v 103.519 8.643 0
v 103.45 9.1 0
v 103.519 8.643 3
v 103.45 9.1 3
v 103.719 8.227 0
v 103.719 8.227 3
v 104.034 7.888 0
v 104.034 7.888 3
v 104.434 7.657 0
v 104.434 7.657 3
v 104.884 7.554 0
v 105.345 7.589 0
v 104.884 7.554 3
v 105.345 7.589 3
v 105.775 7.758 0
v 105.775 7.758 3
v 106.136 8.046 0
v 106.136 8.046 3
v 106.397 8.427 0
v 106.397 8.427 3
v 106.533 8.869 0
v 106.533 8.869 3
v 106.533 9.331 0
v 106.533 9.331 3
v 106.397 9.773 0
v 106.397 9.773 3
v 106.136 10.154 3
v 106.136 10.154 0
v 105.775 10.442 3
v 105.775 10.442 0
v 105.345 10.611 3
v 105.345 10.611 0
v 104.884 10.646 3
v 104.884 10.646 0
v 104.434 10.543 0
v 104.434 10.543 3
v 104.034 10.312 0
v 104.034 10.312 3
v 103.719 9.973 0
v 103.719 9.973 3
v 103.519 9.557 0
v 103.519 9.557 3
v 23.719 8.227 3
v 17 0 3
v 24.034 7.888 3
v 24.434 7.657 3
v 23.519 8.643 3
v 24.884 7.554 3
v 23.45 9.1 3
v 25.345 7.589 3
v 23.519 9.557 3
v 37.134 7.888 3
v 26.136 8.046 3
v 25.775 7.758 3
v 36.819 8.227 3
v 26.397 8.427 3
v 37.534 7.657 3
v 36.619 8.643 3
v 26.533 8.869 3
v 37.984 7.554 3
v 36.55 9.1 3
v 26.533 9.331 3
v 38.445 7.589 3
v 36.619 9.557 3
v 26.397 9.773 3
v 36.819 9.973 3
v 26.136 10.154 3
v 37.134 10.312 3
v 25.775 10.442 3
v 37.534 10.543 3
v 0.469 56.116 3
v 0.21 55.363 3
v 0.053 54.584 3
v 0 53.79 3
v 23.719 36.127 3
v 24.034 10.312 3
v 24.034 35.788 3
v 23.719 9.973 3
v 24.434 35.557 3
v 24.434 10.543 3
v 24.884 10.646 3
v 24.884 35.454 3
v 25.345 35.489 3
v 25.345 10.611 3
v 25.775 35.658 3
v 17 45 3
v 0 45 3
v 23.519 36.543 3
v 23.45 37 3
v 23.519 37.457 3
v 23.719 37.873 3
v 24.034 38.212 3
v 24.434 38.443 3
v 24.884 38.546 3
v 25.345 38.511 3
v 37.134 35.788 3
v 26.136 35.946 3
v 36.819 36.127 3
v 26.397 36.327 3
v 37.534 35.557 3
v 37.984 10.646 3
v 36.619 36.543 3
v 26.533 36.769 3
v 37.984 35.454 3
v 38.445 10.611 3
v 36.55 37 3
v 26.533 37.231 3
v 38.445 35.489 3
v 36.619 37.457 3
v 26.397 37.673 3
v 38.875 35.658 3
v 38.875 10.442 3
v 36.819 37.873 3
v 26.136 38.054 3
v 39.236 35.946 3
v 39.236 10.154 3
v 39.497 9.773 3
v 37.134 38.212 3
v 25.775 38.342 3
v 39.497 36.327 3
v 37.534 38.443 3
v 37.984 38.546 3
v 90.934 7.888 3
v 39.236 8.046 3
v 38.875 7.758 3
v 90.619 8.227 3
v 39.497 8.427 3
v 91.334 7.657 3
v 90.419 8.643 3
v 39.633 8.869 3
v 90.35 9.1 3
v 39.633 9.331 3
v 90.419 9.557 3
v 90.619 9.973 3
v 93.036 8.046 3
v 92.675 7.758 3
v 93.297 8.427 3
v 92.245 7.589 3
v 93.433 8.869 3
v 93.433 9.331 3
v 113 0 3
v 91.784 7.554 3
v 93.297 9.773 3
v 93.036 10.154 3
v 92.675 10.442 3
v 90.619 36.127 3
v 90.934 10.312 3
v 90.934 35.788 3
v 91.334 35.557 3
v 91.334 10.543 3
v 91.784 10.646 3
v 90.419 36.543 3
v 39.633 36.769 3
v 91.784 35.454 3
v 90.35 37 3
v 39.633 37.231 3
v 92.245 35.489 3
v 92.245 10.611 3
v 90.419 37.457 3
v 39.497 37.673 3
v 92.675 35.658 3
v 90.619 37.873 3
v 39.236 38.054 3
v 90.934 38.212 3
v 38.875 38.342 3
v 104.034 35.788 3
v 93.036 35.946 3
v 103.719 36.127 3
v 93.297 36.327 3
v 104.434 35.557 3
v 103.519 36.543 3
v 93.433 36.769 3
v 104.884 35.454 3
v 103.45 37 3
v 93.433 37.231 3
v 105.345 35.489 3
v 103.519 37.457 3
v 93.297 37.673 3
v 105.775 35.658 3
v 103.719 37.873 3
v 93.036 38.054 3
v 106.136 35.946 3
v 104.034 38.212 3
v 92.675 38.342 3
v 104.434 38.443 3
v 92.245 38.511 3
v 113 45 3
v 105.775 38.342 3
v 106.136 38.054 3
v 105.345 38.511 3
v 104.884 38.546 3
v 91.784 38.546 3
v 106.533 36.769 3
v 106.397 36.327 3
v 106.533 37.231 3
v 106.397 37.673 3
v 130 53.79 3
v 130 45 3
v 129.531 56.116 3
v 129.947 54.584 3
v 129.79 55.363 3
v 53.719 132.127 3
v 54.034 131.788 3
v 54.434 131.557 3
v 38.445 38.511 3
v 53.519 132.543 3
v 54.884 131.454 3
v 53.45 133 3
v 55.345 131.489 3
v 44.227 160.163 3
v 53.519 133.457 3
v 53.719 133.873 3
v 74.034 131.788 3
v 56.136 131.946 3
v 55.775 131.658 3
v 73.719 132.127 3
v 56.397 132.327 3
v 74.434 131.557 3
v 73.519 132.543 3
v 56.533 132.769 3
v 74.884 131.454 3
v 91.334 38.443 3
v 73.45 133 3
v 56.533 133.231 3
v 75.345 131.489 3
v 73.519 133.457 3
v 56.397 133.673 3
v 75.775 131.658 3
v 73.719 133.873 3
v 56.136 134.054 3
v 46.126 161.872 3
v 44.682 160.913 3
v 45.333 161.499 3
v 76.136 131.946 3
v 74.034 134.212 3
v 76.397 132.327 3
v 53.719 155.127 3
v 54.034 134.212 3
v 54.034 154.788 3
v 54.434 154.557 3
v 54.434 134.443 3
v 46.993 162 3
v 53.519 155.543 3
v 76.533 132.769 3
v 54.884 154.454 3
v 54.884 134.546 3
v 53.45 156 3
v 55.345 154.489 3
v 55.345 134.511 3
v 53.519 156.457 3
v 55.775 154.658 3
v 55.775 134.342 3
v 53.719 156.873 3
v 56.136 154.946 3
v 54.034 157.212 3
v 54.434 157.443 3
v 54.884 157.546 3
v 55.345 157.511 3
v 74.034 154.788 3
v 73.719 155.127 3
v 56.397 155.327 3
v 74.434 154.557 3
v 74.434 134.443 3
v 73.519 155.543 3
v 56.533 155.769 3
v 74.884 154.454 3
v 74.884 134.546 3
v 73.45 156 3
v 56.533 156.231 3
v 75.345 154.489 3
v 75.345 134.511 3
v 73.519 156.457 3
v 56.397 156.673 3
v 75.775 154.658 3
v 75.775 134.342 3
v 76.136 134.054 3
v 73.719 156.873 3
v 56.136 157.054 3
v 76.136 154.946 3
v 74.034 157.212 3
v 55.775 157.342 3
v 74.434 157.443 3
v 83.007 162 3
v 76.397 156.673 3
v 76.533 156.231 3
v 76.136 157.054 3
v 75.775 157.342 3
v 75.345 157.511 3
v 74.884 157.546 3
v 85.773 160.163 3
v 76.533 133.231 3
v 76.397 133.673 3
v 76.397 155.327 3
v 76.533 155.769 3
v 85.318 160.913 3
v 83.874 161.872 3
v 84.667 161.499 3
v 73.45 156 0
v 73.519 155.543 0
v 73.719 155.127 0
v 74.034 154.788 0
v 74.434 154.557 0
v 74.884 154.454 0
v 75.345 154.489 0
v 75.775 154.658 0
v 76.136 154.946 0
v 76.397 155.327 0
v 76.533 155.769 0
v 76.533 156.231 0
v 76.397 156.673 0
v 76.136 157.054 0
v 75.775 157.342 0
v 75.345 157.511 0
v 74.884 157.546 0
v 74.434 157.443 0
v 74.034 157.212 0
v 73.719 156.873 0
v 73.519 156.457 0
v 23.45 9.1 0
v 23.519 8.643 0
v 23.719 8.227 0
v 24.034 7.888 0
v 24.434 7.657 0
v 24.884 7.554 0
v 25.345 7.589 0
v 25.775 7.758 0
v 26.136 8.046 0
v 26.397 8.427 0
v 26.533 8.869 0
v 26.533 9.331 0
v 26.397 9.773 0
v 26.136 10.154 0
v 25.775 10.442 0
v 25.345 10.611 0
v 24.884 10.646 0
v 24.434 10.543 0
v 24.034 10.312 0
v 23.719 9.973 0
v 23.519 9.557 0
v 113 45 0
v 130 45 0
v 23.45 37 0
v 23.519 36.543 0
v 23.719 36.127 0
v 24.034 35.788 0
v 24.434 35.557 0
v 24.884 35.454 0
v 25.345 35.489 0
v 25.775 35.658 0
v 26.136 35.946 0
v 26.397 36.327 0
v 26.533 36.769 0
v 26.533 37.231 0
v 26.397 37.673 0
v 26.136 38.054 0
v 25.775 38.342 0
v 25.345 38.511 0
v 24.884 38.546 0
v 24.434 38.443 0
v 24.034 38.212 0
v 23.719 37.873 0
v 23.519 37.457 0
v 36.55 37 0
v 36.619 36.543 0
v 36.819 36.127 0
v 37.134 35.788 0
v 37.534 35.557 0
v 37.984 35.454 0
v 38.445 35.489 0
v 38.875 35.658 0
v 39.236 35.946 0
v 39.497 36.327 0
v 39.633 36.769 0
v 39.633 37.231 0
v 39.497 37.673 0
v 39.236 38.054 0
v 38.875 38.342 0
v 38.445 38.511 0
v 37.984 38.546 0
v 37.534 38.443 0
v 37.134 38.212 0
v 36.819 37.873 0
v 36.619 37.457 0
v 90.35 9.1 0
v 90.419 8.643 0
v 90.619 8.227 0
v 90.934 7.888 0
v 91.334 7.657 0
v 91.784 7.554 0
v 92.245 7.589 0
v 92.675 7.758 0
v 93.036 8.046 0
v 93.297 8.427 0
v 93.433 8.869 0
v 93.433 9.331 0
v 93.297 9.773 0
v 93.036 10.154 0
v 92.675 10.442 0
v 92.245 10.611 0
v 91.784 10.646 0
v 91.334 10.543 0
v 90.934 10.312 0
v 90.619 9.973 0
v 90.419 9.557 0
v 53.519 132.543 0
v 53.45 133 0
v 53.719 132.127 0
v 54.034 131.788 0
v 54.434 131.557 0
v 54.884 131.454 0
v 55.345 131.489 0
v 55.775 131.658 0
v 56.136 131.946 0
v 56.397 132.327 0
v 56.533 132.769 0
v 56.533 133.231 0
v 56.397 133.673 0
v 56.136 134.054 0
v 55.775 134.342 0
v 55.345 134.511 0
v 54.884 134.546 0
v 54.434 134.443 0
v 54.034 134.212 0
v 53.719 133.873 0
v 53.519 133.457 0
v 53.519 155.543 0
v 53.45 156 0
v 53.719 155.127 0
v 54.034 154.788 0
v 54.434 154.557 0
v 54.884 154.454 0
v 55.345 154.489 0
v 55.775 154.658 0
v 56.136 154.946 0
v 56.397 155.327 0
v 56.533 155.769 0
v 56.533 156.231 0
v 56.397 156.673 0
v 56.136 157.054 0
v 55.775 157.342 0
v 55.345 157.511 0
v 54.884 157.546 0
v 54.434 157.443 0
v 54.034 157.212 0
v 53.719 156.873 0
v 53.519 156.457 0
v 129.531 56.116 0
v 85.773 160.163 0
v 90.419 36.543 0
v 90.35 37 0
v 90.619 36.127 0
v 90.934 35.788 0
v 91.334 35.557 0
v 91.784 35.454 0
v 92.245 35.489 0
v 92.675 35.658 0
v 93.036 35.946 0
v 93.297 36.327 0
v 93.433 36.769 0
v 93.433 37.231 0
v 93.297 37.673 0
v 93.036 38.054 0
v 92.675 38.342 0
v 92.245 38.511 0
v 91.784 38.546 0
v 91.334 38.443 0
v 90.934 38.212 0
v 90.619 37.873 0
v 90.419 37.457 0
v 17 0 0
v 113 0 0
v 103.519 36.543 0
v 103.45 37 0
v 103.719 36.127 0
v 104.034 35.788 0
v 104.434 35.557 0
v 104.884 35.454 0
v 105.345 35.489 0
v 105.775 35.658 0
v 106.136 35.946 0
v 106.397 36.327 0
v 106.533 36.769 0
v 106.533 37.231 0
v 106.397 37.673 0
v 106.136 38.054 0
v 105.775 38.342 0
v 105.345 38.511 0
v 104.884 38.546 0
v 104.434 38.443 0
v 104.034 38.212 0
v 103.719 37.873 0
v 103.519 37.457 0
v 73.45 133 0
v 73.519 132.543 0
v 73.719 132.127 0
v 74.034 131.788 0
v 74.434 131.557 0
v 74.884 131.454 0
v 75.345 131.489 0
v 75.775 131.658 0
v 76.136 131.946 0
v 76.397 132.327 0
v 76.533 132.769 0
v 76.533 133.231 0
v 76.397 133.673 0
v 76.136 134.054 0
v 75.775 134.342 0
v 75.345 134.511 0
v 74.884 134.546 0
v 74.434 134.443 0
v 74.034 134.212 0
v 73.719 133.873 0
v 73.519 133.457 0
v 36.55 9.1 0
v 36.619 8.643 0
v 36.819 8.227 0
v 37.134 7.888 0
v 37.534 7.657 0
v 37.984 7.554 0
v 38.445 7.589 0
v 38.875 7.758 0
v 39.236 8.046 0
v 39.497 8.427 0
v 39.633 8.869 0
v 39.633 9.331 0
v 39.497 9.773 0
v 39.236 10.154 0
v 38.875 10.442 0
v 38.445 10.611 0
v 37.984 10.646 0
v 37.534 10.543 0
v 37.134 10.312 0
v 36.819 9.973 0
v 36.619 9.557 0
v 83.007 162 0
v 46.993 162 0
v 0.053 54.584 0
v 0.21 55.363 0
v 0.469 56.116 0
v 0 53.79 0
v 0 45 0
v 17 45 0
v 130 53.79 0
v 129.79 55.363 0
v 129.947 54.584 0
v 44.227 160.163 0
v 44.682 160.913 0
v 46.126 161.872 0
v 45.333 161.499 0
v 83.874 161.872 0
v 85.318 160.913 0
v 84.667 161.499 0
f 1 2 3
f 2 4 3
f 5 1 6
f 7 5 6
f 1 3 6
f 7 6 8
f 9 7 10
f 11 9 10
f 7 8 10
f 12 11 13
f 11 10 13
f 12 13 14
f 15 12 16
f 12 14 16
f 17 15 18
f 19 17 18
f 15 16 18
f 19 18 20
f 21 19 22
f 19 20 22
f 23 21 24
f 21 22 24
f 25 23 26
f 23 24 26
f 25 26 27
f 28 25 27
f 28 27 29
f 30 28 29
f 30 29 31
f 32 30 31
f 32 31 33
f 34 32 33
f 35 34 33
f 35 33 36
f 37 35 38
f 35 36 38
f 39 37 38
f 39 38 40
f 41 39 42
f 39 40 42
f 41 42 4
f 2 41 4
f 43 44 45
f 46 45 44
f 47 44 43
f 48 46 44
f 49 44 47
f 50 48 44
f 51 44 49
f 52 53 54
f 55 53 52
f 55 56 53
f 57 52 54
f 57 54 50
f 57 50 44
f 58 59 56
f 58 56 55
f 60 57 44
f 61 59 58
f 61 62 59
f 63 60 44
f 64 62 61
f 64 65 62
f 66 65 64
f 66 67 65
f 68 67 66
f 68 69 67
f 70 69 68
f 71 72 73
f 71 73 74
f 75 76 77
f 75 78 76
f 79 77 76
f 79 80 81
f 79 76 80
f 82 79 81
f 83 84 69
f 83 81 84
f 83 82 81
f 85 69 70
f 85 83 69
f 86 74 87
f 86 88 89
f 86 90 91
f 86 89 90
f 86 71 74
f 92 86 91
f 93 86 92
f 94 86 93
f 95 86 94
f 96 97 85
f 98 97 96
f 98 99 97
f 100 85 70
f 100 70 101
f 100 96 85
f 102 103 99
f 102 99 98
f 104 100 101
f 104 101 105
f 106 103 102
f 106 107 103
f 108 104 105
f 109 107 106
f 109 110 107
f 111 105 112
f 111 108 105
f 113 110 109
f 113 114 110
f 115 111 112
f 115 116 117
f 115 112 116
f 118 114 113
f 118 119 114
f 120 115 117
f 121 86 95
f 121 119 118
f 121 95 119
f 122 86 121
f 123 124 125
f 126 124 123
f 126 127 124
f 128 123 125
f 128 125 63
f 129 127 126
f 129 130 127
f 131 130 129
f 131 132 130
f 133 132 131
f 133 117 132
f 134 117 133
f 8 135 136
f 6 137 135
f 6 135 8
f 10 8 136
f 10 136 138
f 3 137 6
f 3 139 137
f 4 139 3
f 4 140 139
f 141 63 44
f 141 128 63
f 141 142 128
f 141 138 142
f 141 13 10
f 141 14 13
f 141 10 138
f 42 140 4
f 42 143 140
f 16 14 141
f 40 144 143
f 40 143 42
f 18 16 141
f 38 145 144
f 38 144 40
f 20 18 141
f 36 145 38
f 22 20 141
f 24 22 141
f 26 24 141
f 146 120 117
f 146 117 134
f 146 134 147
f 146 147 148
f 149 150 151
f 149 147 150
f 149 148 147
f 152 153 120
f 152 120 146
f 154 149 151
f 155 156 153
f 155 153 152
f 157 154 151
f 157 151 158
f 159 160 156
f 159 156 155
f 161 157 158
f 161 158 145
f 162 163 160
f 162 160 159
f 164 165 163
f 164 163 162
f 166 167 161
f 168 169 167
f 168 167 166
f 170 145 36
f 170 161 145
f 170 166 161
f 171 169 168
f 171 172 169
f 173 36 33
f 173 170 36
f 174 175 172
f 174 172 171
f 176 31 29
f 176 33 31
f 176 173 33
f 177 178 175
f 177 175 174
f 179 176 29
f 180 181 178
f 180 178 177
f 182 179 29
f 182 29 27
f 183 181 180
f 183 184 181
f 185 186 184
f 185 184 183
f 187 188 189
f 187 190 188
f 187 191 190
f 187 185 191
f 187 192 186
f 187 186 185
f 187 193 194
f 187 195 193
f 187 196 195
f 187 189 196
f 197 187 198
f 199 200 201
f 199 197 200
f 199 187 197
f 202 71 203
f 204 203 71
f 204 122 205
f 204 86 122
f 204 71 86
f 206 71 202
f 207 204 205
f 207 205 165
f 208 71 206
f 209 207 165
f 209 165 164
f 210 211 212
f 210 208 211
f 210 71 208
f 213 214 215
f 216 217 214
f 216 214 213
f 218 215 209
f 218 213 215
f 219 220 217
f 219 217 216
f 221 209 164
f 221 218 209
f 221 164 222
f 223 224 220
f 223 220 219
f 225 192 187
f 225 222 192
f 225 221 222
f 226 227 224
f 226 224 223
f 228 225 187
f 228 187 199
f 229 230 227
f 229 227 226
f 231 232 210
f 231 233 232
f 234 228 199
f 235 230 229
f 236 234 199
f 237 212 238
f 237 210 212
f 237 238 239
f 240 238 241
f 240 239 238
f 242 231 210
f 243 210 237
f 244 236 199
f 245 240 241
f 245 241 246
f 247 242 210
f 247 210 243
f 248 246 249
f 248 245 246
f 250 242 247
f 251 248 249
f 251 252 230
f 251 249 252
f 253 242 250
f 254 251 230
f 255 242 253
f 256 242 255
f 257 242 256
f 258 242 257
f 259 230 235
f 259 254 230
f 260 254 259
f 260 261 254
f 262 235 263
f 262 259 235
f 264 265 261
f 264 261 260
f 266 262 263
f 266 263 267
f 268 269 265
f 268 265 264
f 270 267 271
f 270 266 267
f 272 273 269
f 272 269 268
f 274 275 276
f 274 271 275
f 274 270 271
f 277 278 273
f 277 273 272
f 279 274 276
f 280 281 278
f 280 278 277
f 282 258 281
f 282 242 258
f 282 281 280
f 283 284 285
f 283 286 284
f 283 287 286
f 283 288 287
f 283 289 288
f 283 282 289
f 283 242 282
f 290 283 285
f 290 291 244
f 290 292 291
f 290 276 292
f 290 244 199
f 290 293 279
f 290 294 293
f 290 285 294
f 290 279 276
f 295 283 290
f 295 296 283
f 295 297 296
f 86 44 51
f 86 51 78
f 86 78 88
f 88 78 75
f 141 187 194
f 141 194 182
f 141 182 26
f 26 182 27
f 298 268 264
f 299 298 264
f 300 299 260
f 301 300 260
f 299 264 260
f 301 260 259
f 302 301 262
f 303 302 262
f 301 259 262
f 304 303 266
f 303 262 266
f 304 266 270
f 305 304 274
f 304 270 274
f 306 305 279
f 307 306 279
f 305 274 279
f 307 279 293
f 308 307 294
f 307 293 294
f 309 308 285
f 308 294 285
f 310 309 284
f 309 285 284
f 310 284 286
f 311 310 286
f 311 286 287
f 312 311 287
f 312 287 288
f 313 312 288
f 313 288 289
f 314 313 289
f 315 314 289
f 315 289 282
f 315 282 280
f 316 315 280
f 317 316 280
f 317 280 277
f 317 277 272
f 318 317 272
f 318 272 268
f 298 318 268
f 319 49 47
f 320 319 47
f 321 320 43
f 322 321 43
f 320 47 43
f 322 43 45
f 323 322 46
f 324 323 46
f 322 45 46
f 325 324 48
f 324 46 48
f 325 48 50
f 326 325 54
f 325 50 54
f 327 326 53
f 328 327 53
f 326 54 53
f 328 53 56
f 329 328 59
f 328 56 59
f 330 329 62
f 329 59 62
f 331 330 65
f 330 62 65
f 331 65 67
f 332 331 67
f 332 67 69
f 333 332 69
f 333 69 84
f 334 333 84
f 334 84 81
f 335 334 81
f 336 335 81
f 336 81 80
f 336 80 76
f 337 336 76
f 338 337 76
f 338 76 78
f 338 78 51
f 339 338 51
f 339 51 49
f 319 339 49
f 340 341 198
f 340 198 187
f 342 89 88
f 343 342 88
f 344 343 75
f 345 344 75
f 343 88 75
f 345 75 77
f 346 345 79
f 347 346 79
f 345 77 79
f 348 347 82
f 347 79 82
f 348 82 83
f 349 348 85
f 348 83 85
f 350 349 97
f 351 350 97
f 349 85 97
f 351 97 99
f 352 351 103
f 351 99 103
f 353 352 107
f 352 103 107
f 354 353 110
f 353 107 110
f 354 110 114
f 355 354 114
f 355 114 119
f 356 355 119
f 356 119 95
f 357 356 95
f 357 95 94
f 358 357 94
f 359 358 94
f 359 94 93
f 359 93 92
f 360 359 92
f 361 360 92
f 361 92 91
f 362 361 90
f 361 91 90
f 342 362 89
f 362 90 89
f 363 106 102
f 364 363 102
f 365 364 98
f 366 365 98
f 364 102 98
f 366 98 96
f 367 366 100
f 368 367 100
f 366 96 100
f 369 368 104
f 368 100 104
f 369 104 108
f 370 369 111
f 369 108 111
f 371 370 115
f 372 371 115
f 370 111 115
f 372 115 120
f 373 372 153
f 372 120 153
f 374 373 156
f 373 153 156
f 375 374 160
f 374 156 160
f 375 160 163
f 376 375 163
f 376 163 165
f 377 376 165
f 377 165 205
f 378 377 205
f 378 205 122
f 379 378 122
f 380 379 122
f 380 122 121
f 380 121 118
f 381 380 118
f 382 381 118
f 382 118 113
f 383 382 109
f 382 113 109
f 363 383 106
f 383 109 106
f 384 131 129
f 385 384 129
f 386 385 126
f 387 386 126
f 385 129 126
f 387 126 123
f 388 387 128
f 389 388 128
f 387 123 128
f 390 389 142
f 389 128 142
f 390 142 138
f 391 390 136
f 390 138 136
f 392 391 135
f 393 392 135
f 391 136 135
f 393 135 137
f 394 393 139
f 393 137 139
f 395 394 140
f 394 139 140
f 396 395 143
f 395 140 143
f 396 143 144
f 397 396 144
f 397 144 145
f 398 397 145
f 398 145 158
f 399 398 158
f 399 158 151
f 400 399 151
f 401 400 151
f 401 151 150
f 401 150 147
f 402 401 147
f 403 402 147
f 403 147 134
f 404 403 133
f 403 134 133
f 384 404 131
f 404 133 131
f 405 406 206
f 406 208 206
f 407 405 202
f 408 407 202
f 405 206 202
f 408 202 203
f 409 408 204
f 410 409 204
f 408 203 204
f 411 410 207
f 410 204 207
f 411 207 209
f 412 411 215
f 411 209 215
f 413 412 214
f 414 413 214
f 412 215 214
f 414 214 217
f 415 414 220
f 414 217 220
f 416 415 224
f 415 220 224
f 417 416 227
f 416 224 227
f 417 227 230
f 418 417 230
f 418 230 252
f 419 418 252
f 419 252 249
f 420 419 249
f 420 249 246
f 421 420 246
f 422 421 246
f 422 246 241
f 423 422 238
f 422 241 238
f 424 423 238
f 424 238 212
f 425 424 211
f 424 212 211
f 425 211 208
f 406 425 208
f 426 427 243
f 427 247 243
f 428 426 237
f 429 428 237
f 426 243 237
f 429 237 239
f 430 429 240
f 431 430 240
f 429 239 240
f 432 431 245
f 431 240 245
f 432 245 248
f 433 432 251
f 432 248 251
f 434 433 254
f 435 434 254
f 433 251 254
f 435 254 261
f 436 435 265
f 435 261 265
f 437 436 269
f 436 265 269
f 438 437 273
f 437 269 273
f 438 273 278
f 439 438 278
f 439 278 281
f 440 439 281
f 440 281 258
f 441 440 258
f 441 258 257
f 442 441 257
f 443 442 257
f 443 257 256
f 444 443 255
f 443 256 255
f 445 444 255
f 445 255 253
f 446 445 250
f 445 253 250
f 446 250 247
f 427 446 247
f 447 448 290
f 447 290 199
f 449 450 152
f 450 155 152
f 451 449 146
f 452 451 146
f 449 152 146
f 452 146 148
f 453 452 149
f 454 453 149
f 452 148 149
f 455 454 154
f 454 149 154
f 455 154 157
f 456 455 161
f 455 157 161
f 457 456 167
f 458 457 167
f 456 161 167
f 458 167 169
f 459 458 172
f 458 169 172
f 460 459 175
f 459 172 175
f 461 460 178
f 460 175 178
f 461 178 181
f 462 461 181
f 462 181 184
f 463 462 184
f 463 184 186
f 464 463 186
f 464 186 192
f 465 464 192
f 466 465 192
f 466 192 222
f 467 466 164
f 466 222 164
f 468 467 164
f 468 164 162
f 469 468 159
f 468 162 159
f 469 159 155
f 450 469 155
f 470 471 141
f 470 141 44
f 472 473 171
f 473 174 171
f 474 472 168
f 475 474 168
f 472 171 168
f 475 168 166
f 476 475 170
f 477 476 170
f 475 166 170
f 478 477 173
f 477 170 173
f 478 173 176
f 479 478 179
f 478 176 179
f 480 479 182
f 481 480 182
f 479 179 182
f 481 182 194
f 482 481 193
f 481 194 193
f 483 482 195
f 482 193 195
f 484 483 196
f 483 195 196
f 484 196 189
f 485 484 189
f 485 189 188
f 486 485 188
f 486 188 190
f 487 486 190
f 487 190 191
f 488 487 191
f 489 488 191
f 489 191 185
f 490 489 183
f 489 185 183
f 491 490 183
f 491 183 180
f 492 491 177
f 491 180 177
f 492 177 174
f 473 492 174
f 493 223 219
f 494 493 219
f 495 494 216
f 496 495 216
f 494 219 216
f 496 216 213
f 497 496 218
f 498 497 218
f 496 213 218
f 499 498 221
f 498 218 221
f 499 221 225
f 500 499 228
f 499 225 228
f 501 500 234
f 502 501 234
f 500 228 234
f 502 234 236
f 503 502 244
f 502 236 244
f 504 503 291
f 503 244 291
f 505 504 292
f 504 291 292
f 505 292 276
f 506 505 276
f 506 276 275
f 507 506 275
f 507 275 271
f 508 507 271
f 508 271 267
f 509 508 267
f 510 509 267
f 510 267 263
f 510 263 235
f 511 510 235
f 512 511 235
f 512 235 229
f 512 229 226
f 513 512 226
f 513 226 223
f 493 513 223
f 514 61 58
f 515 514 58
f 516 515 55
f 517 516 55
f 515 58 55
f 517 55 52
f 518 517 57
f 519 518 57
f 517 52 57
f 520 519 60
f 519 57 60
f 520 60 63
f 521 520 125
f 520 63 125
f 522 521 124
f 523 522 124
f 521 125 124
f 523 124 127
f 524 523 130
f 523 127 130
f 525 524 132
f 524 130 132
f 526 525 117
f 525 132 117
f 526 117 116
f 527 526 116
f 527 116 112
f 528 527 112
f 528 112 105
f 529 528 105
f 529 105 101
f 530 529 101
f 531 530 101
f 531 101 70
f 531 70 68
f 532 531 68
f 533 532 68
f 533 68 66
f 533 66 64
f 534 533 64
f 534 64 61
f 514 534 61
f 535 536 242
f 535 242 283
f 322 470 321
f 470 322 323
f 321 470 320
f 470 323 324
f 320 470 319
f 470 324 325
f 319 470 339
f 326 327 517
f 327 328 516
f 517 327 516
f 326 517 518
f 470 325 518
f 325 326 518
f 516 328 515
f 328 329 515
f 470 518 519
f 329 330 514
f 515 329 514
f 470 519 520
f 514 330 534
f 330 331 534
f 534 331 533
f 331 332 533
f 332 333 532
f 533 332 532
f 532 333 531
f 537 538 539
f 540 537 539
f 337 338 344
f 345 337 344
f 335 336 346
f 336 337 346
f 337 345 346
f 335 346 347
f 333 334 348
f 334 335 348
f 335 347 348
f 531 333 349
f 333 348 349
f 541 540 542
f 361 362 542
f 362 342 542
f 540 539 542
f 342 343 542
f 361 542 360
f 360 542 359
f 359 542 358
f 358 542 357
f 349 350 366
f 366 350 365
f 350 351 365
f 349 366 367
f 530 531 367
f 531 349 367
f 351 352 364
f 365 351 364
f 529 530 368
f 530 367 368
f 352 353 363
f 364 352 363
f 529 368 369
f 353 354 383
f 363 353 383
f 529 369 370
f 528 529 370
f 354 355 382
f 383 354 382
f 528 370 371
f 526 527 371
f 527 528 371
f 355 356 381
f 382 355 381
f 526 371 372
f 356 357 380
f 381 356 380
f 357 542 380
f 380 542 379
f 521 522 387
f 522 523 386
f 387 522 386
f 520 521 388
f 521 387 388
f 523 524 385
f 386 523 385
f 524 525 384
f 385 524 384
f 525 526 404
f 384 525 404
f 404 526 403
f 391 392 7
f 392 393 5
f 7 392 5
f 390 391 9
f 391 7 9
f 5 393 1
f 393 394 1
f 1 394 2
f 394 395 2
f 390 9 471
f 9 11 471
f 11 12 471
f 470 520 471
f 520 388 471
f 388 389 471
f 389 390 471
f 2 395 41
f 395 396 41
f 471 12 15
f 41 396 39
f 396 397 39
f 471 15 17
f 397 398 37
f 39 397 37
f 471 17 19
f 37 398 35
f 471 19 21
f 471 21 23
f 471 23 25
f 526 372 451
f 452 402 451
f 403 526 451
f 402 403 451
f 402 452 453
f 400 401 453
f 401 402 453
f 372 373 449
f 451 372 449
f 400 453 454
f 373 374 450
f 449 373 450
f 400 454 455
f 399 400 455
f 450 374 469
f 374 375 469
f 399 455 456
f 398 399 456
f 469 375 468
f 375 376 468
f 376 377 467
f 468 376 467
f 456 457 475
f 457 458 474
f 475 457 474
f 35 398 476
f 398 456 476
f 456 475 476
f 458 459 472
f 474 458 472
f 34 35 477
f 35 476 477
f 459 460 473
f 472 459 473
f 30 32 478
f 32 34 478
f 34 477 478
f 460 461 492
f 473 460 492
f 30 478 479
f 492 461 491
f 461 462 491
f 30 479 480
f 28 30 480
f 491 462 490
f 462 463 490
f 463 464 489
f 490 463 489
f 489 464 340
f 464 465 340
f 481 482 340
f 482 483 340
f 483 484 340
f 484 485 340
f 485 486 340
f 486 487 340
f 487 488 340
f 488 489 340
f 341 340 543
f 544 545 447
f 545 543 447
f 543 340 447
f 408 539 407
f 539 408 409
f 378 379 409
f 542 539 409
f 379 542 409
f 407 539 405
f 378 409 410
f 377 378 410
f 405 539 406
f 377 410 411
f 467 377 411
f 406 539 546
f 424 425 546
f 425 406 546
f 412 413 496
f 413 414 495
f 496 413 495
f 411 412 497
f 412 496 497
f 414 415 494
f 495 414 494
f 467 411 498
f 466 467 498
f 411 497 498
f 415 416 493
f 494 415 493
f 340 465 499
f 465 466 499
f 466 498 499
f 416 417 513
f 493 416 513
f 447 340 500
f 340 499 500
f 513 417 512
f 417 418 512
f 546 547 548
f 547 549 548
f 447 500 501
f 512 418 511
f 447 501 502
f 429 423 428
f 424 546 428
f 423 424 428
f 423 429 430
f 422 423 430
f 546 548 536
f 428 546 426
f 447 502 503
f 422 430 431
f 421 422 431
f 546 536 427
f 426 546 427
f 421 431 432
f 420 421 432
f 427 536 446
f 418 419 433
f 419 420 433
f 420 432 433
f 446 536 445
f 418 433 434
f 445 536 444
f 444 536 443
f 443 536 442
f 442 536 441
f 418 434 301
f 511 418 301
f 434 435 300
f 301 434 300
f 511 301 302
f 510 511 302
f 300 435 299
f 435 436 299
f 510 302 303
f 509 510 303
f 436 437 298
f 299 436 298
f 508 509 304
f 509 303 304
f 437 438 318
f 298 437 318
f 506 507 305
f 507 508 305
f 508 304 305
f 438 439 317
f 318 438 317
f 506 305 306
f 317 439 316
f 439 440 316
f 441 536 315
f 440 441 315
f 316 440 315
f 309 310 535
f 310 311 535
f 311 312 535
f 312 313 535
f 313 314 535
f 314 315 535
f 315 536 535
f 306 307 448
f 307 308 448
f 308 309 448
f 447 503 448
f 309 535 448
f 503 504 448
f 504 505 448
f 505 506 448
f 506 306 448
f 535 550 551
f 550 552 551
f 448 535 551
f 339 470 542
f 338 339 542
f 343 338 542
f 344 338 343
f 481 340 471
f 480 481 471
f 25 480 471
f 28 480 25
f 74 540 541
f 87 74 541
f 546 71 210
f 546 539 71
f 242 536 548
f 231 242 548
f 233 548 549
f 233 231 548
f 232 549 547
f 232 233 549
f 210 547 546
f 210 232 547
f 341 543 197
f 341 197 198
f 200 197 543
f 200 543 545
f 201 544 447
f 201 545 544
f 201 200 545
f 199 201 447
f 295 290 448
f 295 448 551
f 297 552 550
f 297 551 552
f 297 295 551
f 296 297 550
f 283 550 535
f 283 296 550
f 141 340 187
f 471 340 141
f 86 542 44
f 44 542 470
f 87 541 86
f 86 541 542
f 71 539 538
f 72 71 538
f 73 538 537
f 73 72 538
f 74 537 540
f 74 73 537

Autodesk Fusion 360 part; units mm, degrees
sketch "Main" plane through (0, 0, 0) normal (0, 0, 1) x (1, 0, 0)
  line L0 (0, 55) -> (45, 162)
  line L1 (45, 162) -> (85, 162)
  line L2 (85, 162) -> (130, 55)
  line L3 (113, 0) -> (17, 0)
  line L4 (65, 0) -> (65, 162) construction
  line L5 (0, 55) -> (0, 45)
  line L6 (0, 45) -> (17, 45)
  line L7 (17, 45) -> (17, 0)
  line L8 (130, 55) -> (130, 45)
  line L9 (130, 45) -> (113, 45)
  line L10 (113, 45) -> (113, 0)
  dimension "d2" = 162
  dimension "d6" = 55
  dimension "d9" = 40
  dimension "d45" = 130
  dimension "d47" = 17
  dimension "d48" = 17
  dimension "d49" = 10
  dimension "d50" = 10
extrude "Extrude1" add sketch "Main" along normal blind 3
sketch "Head Tube Holes" plane through (0, 0, 3) normal (0, 0, 1) x (-1, 0, 0)
  line L0 (-17, 0) -> (-113, 0)
  line L1 (-130, -55) -> (-85, -162)
  line L2 (-85, -162) -> (-45, -162)
  line L3 (-45, -162) -> (0, -55)
  circle A0 centre (-55, -156) radius 1.55
  line L4 (-65, -162) -> (-65, 0) construction
  circle A1 centre (-75, -156) radius 1.55
  circle A2 centre (-55, -133) radius 1.55
  circle A3 centre (-75, -133) radius 1.55
  line L5 (0, -55) -> (0, -45)
  line L6 (0, -45) -> (-17, -45)
  line L7 (-17, -45) -> (-17, 0)
  line L8 (-113, 0) -> (-113, -45)
  line L9 (-113, -45) -> (-130, -45)
  line L10 (-130, -45) -> (-130, -55)
  dimension "d19" = 3.1
  dimension "d20" = 6
  dimension "d21" = 10
  dimension "d24" = -20
  dimension "d25" = 23
extrude "Extrude2" cut sketch "Head Tube Holes" against normal up to surface (3 mm away) contours A0 | A1 | A2 | A3
sketch "Motor Box Holes" plane through (0, 0, 3) normal (0, 0, 1) x (-1, 0, 0)
  circle A0 centre (-75, -156) radius 1.55
  circle A1 centre (-55, -156) radius 1.55
  circle A2 centre (-75, -133) radius 1.55
  circle A3 centre (-55, -133) radius 1.55
  line L0 (-17, 0) -> (-113, 0)
  line L1 (-17, -37) -> (-113, -37) construction
  circle A4 centre (-25, -37) radius 1.55
  circle A5 centre (-38.1, -37) radius 1.55
  circle A6 centre (-25, -9.1) radius 1.55
  circle A7 centre (-38.1, -9.1) radius 1.55
  circle A8 centre (-105, -37) radius 1.55
  circle A9 centre (-91.9, -37) radius 1.55
  circle A10 centre (-105, -9.1) radius 1.55
  circle A11 centre (-91.9, -9.1) radius 1.55
  line L2 (-17, -45) -> (-17, 0)
  line L3 (-113, 0) -> (-113, -45)
  dimension "d30" = 3.1
  dimension "d32" = 37
  dimension "d35" = -13.1
  dimension "d36" = 27.9
  dimension "d37" = 3.1
  dimension "d40" = 13.1
  dimension "d41" = 27.9
  dimension "d53" = 8
  dimension "d54" = 8
extrude "Extrude3" cut sketch "Motor Box Holes" against normal through all contours A4 | A5 | A6 | A7 | A8 | A9 | A10 | A11
fillet "Fillet5" radius 3 2 edges at (45, 162, 1.5) (85, 162, 1.5)
fillet "Fillet6" radius 6 2 edges at (0, 55, 1.5) (130, 55, 1.5)
